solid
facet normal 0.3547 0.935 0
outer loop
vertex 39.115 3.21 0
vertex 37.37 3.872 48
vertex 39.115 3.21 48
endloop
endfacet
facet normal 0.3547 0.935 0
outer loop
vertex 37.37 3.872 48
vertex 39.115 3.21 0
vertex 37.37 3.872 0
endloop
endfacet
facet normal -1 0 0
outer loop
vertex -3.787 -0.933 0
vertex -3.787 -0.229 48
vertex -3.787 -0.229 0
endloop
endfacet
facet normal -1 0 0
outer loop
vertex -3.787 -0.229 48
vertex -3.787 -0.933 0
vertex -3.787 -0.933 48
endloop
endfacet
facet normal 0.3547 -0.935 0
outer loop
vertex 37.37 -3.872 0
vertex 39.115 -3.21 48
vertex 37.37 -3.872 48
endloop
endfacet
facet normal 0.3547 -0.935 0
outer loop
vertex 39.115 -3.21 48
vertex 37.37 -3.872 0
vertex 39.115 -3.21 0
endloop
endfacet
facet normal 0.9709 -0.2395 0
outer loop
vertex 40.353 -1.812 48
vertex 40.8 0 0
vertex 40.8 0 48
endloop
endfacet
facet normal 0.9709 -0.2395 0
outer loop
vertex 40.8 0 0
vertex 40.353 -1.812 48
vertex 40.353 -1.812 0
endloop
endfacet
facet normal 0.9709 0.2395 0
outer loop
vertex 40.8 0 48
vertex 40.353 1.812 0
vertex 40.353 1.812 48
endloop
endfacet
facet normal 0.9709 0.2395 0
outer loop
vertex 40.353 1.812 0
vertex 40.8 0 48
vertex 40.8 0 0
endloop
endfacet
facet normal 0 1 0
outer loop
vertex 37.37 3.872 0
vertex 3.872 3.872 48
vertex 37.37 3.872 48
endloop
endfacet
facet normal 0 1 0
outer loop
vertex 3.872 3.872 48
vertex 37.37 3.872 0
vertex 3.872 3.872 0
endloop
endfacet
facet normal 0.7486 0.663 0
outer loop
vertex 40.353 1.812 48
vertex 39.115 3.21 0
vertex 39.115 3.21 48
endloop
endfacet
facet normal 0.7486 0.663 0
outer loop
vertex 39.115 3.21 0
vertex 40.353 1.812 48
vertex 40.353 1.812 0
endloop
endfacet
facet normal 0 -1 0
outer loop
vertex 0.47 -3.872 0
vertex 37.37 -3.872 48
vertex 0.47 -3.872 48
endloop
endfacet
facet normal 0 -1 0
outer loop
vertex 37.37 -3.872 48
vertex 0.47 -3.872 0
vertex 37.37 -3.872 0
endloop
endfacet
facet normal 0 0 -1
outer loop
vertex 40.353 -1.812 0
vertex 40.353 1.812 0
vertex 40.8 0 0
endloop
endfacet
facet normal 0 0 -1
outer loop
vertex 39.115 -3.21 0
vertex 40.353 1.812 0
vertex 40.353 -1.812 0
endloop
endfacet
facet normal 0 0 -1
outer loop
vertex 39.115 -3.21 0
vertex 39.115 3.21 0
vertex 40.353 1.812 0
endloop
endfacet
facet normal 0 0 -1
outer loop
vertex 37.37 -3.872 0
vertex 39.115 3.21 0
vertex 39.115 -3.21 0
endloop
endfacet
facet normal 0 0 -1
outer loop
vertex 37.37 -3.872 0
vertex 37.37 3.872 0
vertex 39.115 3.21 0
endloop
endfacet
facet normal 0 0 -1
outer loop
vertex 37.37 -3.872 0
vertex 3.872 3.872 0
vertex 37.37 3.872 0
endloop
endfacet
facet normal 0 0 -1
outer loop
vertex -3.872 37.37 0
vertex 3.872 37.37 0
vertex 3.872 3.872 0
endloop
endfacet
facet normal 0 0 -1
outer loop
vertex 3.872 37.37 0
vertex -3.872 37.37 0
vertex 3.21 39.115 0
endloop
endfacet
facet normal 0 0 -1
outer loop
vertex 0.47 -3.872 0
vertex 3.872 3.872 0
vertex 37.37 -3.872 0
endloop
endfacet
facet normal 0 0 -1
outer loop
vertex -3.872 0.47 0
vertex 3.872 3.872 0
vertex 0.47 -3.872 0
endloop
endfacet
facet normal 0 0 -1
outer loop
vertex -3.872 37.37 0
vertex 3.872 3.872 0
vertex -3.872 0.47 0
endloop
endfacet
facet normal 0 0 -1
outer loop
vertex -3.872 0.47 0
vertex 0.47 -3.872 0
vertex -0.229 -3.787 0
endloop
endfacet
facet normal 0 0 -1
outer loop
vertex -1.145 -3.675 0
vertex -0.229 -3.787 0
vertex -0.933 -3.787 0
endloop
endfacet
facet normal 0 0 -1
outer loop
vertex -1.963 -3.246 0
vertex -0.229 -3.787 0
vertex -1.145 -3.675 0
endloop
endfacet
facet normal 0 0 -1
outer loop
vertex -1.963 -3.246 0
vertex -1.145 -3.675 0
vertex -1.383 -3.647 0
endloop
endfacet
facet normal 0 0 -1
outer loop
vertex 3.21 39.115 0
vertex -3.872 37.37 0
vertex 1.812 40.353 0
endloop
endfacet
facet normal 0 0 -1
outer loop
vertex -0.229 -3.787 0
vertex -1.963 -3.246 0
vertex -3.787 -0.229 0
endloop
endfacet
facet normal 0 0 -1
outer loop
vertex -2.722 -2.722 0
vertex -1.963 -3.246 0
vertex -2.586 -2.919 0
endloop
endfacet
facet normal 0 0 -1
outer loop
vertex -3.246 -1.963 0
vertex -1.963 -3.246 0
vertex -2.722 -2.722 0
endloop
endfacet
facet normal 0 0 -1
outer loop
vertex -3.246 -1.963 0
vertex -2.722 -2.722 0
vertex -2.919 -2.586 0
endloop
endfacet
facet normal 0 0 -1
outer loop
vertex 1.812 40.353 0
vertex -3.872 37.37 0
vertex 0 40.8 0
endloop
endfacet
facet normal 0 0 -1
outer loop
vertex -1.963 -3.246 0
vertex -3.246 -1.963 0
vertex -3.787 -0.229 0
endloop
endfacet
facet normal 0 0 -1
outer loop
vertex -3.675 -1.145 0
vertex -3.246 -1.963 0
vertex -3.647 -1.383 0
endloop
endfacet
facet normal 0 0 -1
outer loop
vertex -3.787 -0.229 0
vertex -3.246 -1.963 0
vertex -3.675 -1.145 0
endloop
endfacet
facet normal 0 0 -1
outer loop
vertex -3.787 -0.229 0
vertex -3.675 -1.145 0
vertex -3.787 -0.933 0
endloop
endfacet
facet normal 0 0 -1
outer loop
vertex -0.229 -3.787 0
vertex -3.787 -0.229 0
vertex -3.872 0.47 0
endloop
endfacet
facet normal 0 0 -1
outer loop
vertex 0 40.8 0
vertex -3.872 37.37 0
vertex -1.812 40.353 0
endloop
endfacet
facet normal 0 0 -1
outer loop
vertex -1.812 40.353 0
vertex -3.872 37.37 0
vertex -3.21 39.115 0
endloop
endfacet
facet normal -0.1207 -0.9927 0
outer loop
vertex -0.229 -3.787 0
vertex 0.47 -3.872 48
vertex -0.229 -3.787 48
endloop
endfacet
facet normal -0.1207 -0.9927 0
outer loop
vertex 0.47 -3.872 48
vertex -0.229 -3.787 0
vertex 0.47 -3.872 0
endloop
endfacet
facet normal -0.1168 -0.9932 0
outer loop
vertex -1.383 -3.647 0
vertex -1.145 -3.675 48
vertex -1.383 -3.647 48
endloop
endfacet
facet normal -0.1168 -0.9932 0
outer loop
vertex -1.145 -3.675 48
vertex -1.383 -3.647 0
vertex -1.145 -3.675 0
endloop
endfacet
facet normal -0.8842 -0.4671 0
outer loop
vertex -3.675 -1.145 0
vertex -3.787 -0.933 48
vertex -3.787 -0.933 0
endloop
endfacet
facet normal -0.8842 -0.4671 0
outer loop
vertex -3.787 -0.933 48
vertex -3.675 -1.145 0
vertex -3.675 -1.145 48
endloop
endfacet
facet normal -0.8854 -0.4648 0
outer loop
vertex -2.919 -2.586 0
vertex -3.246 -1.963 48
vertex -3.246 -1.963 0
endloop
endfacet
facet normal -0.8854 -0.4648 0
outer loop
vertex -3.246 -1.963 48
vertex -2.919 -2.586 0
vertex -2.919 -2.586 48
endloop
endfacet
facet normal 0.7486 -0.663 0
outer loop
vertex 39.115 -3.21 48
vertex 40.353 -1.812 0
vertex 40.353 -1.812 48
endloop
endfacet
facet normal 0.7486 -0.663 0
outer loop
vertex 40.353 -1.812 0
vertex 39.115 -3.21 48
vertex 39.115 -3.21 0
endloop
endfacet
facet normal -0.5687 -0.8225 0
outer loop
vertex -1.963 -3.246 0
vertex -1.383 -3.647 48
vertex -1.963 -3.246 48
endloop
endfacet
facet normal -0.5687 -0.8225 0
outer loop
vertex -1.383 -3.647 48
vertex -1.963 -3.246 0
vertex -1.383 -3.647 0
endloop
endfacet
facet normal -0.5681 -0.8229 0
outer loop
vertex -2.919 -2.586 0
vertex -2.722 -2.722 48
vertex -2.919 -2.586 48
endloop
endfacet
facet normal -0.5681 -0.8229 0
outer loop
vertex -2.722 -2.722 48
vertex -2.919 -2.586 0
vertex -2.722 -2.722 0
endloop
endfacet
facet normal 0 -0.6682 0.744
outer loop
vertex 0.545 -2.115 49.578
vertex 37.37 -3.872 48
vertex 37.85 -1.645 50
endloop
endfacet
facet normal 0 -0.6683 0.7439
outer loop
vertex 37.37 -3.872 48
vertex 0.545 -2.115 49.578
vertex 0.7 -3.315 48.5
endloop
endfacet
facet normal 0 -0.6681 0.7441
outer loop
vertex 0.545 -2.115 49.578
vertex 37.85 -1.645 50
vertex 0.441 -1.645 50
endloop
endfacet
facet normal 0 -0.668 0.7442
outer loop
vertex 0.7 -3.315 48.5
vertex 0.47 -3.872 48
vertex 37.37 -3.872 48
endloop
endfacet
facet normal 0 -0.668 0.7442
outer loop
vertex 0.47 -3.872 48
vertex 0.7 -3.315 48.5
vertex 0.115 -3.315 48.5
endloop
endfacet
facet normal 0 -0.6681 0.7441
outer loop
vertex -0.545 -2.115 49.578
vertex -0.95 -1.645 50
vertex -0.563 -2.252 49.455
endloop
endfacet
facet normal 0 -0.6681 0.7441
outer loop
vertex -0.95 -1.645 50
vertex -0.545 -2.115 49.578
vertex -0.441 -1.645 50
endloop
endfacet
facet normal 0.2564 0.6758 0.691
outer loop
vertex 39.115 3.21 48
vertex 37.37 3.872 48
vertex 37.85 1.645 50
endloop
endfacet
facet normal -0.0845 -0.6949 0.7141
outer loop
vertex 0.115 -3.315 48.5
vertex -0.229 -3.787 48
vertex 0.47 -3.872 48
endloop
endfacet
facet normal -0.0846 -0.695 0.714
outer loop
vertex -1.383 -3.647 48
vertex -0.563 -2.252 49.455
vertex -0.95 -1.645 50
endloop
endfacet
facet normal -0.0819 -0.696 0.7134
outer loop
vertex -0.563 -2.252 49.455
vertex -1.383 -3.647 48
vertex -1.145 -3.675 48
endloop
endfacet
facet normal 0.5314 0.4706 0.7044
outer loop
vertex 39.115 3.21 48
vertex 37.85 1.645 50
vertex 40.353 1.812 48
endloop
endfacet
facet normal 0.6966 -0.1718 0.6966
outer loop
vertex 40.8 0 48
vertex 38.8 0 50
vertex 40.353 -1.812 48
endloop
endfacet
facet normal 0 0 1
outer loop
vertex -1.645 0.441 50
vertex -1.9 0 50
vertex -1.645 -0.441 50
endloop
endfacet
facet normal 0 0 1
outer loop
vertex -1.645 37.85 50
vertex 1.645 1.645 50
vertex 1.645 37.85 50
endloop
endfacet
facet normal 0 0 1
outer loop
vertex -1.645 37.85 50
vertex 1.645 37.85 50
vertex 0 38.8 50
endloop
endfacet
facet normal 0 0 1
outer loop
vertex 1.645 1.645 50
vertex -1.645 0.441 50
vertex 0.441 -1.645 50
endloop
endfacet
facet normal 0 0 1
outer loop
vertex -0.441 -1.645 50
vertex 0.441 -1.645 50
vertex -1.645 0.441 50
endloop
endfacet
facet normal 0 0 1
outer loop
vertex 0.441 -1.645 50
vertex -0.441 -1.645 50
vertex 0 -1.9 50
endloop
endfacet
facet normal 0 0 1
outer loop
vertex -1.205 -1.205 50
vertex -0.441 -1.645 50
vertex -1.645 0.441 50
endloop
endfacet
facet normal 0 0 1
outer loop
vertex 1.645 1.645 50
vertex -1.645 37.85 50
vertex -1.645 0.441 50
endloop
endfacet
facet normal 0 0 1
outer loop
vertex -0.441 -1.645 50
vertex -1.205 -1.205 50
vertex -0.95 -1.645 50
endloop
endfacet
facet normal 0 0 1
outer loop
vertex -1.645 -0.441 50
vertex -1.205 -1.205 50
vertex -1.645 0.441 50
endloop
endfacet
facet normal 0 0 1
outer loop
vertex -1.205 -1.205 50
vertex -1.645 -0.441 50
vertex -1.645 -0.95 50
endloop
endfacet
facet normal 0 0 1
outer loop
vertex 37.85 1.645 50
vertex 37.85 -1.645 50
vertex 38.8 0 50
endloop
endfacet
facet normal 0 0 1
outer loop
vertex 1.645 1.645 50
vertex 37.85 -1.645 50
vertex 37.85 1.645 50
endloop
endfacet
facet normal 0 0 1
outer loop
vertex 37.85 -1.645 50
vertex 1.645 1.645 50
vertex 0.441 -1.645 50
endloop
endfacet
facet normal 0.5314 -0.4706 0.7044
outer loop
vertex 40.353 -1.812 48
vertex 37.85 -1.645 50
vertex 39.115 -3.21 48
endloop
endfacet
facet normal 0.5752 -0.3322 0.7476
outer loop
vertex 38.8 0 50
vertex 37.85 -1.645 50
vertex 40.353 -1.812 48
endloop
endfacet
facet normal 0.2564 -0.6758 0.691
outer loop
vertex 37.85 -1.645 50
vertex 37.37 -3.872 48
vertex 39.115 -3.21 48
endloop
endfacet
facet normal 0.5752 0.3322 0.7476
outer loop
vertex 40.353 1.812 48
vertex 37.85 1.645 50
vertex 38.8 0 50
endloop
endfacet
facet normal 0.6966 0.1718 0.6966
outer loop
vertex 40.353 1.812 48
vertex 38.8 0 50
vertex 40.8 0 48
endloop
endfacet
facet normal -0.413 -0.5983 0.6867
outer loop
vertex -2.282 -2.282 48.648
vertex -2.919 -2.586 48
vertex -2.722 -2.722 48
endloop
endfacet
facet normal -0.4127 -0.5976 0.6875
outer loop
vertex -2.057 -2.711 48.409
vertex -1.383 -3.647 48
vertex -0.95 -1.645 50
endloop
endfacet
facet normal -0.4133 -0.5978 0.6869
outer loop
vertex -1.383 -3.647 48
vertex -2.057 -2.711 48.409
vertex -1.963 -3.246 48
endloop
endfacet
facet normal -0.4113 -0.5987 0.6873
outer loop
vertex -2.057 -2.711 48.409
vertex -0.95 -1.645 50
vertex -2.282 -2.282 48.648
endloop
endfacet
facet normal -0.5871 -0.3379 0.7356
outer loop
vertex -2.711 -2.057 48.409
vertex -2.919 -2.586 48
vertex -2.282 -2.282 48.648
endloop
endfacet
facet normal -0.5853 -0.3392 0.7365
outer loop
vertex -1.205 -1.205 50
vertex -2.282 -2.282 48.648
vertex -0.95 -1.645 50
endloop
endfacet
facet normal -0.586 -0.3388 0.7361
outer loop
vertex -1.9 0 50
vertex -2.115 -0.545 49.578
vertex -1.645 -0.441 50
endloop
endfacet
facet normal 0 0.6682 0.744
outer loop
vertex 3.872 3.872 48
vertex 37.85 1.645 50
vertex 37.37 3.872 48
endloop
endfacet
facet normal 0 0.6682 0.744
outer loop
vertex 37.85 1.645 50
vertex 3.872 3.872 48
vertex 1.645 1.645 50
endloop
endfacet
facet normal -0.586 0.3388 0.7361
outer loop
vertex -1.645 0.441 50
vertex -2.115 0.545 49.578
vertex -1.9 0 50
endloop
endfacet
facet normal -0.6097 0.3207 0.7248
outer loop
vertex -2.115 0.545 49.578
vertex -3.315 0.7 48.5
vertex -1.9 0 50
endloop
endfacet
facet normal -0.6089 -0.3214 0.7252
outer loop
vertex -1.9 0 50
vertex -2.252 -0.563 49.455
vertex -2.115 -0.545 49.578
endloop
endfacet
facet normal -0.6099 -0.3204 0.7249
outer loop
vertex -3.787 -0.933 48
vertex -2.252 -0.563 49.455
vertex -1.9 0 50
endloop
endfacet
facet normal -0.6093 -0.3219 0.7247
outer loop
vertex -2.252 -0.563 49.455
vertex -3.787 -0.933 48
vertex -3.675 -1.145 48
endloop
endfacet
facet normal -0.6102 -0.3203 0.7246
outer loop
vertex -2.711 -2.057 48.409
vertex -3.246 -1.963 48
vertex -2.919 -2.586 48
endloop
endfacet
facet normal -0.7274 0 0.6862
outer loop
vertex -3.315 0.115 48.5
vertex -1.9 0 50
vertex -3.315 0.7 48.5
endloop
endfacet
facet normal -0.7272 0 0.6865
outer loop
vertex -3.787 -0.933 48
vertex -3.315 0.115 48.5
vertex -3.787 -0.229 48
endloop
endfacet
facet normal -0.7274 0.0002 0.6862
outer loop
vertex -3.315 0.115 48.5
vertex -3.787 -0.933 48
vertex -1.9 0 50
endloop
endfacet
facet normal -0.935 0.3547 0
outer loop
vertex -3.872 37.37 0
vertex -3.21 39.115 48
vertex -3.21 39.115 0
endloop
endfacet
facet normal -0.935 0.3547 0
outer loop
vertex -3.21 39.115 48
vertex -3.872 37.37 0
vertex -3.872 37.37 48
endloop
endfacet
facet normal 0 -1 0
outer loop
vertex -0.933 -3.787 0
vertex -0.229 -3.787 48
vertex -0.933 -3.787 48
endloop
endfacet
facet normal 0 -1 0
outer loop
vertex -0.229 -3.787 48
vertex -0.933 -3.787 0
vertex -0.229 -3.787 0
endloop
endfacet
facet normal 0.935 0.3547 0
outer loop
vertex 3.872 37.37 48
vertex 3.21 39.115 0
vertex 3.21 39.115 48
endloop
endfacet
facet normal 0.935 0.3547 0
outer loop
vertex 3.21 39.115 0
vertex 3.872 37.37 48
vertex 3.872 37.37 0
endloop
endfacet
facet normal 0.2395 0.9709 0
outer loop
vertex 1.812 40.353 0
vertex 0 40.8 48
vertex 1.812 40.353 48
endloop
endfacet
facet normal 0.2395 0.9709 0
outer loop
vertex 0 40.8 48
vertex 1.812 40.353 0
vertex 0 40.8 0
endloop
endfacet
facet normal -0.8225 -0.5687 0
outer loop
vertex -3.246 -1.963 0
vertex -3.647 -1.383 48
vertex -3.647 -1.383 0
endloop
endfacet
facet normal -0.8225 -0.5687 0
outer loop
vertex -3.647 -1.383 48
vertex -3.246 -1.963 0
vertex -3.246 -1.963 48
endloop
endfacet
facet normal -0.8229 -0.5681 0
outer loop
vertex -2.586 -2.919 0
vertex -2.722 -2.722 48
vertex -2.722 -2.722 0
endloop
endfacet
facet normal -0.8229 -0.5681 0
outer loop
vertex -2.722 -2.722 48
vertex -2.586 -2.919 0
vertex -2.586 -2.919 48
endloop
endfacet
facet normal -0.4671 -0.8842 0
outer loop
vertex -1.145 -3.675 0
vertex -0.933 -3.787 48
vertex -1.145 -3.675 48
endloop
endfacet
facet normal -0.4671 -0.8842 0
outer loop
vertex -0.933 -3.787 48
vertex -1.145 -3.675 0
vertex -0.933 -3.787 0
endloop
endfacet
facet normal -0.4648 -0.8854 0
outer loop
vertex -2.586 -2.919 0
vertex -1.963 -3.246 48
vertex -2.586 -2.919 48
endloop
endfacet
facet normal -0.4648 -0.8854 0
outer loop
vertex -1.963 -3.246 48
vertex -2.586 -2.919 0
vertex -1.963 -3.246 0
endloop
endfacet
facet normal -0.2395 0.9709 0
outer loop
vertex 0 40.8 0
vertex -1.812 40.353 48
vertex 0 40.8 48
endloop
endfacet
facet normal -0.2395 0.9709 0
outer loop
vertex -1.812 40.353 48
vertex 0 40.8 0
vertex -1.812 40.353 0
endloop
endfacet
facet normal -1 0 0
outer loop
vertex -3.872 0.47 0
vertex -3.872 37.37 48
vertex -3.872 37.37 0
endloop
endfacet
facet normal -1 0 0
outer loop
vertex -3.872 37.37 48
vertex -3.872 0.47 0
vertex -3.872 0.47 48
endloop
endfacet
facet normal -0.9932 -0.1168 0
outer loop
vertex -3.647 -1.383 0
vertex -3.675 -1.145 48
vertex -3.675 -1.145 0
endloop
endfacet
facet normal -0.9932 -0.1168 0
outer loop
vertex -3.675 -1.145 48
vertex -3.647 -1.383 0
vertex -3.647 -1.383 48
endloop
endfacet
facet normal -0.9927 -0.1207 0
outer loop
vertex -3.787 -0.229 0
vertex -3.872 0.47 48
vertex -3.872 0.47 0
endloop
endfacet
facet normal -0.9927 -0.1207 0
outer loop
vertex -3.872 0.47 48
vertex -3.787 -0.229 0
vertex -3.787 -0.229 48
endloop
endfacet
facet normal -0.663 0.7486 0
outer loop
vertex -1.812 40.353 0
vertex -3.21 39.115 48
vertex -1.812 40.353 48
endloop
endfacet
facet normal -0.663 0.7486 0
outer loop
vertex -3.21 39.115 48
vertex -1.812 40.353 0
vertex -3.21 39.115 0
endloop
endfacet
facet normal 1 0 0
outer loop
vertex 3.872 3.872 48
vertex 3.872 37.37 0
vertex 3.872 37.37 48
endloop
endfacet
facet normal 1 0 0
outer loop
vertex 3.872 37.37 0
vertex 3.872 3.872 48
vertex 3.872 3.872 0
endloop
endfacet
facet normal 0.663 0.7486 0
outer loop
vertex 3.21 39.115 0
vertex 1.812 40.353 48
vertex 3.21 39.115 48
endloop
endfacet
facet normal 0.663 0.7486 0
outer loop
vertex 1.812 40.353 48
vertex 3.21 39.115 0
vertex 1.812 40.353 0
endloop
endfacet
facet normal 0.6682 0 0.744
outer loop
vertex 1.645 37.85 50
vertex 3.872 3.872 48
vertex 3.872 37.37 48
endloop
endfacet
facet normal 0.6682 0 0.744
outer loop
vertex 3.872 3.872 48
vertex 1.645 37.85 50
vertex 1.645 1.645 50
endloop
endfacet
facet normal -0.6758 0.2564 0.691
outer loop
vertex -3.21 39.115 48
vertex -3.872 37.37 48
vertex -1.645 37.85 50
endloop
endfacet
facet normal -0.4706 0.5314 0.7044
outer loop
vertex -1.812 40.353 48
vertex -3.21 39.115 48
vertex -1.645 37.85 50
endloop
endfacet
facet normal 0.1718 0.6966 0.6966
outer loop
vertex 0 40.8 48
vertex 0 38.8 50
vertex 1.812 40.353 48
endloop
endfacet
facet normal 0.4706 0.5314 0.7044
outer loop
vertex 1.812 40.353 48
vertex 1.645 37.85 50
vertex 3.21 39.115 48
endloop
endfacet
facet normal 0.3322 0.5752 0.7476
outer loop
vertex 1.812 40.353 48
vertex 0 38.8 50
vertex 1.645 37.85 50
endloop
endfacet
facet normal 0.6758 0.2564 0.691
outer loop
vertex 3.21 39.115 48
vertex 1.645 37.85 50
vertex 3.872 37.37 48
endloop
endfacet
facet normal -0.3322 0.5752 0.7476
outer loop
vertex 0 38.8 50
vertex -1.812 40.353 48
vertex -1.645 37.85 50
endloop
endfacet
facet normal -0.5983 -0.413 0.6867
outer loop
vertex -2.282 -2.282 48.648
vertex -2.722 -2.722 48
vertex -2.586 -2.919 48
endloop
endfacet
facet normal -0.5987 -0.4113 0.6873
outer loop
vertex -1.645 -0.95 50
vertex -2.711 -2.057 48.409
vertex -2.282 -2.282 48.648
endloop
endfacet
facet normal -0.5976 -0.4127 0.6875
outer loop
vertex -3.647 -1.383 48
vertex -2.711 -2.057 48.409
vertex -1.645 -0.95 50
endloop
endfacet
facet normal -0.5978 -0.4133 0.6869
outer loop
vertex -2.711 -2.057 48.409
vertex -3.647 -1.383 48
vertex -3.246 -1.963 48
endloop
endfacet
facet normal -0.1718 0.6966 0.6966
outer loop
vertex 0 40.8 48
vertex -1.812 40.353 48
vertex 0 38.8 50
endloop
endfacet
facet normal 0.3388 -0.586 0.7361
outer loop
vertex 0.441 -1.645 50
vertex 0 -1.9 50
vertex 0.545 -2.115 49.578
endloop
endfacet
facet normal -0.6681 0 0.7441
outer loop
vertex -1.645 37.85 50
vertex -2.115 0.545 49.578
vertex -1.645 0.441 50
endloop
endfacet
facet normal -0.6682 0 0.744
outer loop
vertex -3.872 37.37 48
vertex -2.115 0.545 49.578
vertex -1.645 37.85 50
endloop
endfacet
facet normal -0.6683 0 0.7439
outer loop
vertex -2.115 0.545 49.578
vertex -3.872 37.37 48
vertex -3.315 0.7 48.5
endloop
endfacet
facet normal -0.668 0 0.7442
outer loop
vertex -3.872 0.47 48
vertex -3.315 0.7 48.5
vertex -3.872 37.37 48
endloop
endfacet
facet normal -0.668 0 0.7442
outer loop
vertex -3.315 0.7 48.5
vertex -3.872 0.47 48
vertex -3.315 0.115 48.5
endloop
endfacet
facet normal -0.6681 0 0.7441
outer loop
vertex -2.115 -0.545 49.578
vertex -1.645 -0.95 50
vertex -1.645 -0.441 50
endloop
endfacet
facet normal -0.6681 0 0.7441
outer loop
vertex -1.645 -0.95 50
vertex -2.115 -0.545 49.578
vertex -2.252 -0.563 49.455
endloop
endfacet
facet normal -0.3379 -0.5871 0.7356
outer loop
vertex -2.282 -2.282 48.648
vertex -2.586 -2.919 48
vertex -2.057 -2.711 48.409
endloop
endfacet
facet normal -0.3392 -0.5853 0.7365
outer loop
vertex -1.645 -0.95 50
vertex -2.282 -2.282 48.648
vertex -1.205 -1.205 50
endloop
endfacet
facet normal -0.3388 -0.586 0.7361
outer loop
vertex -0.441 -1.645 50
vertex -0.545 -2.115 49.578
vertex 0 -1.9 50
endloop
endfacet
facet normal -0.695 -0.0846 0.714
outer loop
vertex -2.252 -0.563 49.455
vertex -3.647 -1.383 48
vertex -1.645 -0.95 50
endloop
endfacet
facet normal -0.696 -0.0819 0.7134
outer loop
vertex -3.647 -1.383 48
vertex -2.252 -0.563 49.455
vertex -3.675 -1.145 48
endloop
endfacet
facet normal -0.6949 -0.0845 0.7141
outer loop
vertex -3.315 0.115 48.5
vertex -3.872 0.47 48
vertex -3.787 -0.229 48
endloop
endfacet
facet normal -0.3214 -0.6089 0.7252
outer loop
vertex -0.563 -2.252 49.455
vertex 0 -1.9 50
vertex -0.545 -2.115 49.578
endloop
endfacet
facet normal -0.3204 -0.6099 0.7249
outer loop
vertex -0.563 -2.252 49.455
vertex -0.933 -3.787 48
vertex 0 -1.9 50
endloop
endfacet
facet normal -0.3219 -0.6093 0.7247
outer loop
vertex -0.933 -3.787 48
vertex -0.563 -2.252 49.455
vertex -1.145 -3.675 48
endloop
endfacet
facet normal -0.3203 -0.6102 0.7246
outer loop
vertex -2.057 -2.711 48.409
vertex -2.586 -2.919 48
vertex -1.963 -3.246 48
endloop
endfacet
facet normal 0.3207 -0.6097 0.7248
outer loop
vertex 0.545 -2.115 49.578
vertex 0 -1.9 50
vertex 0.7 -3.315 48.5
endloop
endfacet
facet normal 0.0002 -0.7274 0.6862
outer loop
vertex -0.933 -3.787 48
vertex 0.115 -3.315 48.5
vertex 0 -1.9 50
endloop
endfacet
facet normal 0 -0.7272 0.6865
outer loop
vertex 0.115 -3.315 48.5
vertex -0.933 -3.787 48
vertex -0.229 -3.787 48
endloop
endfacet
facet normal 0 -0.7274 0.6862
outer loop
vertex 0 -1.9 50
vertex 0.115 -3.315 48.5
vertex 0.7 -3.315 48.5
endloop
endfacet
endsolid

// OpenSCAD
width = 45-.3;
thickness = width-36.9;
height = 50;
attenuate = 2;

echo(thickness);

module base(delta) {
    hull() {
    circle(d=thickness-2*delta);
    translate([width-thickness,0]) circle(d=thickness-2*delta);
    }
}

for(a=[0,90]) rotate([0,0,a]) {
    linear_extrude(height=height-attenuate) base(0);
    translate([0,0,height-attenuate-0.001])
    hull() {
        linear_extrude(height=0.001) base(0);
        translate([0,0,attenuate]) linear_extrude(height=0.001) base(attenuate);
    }
}
